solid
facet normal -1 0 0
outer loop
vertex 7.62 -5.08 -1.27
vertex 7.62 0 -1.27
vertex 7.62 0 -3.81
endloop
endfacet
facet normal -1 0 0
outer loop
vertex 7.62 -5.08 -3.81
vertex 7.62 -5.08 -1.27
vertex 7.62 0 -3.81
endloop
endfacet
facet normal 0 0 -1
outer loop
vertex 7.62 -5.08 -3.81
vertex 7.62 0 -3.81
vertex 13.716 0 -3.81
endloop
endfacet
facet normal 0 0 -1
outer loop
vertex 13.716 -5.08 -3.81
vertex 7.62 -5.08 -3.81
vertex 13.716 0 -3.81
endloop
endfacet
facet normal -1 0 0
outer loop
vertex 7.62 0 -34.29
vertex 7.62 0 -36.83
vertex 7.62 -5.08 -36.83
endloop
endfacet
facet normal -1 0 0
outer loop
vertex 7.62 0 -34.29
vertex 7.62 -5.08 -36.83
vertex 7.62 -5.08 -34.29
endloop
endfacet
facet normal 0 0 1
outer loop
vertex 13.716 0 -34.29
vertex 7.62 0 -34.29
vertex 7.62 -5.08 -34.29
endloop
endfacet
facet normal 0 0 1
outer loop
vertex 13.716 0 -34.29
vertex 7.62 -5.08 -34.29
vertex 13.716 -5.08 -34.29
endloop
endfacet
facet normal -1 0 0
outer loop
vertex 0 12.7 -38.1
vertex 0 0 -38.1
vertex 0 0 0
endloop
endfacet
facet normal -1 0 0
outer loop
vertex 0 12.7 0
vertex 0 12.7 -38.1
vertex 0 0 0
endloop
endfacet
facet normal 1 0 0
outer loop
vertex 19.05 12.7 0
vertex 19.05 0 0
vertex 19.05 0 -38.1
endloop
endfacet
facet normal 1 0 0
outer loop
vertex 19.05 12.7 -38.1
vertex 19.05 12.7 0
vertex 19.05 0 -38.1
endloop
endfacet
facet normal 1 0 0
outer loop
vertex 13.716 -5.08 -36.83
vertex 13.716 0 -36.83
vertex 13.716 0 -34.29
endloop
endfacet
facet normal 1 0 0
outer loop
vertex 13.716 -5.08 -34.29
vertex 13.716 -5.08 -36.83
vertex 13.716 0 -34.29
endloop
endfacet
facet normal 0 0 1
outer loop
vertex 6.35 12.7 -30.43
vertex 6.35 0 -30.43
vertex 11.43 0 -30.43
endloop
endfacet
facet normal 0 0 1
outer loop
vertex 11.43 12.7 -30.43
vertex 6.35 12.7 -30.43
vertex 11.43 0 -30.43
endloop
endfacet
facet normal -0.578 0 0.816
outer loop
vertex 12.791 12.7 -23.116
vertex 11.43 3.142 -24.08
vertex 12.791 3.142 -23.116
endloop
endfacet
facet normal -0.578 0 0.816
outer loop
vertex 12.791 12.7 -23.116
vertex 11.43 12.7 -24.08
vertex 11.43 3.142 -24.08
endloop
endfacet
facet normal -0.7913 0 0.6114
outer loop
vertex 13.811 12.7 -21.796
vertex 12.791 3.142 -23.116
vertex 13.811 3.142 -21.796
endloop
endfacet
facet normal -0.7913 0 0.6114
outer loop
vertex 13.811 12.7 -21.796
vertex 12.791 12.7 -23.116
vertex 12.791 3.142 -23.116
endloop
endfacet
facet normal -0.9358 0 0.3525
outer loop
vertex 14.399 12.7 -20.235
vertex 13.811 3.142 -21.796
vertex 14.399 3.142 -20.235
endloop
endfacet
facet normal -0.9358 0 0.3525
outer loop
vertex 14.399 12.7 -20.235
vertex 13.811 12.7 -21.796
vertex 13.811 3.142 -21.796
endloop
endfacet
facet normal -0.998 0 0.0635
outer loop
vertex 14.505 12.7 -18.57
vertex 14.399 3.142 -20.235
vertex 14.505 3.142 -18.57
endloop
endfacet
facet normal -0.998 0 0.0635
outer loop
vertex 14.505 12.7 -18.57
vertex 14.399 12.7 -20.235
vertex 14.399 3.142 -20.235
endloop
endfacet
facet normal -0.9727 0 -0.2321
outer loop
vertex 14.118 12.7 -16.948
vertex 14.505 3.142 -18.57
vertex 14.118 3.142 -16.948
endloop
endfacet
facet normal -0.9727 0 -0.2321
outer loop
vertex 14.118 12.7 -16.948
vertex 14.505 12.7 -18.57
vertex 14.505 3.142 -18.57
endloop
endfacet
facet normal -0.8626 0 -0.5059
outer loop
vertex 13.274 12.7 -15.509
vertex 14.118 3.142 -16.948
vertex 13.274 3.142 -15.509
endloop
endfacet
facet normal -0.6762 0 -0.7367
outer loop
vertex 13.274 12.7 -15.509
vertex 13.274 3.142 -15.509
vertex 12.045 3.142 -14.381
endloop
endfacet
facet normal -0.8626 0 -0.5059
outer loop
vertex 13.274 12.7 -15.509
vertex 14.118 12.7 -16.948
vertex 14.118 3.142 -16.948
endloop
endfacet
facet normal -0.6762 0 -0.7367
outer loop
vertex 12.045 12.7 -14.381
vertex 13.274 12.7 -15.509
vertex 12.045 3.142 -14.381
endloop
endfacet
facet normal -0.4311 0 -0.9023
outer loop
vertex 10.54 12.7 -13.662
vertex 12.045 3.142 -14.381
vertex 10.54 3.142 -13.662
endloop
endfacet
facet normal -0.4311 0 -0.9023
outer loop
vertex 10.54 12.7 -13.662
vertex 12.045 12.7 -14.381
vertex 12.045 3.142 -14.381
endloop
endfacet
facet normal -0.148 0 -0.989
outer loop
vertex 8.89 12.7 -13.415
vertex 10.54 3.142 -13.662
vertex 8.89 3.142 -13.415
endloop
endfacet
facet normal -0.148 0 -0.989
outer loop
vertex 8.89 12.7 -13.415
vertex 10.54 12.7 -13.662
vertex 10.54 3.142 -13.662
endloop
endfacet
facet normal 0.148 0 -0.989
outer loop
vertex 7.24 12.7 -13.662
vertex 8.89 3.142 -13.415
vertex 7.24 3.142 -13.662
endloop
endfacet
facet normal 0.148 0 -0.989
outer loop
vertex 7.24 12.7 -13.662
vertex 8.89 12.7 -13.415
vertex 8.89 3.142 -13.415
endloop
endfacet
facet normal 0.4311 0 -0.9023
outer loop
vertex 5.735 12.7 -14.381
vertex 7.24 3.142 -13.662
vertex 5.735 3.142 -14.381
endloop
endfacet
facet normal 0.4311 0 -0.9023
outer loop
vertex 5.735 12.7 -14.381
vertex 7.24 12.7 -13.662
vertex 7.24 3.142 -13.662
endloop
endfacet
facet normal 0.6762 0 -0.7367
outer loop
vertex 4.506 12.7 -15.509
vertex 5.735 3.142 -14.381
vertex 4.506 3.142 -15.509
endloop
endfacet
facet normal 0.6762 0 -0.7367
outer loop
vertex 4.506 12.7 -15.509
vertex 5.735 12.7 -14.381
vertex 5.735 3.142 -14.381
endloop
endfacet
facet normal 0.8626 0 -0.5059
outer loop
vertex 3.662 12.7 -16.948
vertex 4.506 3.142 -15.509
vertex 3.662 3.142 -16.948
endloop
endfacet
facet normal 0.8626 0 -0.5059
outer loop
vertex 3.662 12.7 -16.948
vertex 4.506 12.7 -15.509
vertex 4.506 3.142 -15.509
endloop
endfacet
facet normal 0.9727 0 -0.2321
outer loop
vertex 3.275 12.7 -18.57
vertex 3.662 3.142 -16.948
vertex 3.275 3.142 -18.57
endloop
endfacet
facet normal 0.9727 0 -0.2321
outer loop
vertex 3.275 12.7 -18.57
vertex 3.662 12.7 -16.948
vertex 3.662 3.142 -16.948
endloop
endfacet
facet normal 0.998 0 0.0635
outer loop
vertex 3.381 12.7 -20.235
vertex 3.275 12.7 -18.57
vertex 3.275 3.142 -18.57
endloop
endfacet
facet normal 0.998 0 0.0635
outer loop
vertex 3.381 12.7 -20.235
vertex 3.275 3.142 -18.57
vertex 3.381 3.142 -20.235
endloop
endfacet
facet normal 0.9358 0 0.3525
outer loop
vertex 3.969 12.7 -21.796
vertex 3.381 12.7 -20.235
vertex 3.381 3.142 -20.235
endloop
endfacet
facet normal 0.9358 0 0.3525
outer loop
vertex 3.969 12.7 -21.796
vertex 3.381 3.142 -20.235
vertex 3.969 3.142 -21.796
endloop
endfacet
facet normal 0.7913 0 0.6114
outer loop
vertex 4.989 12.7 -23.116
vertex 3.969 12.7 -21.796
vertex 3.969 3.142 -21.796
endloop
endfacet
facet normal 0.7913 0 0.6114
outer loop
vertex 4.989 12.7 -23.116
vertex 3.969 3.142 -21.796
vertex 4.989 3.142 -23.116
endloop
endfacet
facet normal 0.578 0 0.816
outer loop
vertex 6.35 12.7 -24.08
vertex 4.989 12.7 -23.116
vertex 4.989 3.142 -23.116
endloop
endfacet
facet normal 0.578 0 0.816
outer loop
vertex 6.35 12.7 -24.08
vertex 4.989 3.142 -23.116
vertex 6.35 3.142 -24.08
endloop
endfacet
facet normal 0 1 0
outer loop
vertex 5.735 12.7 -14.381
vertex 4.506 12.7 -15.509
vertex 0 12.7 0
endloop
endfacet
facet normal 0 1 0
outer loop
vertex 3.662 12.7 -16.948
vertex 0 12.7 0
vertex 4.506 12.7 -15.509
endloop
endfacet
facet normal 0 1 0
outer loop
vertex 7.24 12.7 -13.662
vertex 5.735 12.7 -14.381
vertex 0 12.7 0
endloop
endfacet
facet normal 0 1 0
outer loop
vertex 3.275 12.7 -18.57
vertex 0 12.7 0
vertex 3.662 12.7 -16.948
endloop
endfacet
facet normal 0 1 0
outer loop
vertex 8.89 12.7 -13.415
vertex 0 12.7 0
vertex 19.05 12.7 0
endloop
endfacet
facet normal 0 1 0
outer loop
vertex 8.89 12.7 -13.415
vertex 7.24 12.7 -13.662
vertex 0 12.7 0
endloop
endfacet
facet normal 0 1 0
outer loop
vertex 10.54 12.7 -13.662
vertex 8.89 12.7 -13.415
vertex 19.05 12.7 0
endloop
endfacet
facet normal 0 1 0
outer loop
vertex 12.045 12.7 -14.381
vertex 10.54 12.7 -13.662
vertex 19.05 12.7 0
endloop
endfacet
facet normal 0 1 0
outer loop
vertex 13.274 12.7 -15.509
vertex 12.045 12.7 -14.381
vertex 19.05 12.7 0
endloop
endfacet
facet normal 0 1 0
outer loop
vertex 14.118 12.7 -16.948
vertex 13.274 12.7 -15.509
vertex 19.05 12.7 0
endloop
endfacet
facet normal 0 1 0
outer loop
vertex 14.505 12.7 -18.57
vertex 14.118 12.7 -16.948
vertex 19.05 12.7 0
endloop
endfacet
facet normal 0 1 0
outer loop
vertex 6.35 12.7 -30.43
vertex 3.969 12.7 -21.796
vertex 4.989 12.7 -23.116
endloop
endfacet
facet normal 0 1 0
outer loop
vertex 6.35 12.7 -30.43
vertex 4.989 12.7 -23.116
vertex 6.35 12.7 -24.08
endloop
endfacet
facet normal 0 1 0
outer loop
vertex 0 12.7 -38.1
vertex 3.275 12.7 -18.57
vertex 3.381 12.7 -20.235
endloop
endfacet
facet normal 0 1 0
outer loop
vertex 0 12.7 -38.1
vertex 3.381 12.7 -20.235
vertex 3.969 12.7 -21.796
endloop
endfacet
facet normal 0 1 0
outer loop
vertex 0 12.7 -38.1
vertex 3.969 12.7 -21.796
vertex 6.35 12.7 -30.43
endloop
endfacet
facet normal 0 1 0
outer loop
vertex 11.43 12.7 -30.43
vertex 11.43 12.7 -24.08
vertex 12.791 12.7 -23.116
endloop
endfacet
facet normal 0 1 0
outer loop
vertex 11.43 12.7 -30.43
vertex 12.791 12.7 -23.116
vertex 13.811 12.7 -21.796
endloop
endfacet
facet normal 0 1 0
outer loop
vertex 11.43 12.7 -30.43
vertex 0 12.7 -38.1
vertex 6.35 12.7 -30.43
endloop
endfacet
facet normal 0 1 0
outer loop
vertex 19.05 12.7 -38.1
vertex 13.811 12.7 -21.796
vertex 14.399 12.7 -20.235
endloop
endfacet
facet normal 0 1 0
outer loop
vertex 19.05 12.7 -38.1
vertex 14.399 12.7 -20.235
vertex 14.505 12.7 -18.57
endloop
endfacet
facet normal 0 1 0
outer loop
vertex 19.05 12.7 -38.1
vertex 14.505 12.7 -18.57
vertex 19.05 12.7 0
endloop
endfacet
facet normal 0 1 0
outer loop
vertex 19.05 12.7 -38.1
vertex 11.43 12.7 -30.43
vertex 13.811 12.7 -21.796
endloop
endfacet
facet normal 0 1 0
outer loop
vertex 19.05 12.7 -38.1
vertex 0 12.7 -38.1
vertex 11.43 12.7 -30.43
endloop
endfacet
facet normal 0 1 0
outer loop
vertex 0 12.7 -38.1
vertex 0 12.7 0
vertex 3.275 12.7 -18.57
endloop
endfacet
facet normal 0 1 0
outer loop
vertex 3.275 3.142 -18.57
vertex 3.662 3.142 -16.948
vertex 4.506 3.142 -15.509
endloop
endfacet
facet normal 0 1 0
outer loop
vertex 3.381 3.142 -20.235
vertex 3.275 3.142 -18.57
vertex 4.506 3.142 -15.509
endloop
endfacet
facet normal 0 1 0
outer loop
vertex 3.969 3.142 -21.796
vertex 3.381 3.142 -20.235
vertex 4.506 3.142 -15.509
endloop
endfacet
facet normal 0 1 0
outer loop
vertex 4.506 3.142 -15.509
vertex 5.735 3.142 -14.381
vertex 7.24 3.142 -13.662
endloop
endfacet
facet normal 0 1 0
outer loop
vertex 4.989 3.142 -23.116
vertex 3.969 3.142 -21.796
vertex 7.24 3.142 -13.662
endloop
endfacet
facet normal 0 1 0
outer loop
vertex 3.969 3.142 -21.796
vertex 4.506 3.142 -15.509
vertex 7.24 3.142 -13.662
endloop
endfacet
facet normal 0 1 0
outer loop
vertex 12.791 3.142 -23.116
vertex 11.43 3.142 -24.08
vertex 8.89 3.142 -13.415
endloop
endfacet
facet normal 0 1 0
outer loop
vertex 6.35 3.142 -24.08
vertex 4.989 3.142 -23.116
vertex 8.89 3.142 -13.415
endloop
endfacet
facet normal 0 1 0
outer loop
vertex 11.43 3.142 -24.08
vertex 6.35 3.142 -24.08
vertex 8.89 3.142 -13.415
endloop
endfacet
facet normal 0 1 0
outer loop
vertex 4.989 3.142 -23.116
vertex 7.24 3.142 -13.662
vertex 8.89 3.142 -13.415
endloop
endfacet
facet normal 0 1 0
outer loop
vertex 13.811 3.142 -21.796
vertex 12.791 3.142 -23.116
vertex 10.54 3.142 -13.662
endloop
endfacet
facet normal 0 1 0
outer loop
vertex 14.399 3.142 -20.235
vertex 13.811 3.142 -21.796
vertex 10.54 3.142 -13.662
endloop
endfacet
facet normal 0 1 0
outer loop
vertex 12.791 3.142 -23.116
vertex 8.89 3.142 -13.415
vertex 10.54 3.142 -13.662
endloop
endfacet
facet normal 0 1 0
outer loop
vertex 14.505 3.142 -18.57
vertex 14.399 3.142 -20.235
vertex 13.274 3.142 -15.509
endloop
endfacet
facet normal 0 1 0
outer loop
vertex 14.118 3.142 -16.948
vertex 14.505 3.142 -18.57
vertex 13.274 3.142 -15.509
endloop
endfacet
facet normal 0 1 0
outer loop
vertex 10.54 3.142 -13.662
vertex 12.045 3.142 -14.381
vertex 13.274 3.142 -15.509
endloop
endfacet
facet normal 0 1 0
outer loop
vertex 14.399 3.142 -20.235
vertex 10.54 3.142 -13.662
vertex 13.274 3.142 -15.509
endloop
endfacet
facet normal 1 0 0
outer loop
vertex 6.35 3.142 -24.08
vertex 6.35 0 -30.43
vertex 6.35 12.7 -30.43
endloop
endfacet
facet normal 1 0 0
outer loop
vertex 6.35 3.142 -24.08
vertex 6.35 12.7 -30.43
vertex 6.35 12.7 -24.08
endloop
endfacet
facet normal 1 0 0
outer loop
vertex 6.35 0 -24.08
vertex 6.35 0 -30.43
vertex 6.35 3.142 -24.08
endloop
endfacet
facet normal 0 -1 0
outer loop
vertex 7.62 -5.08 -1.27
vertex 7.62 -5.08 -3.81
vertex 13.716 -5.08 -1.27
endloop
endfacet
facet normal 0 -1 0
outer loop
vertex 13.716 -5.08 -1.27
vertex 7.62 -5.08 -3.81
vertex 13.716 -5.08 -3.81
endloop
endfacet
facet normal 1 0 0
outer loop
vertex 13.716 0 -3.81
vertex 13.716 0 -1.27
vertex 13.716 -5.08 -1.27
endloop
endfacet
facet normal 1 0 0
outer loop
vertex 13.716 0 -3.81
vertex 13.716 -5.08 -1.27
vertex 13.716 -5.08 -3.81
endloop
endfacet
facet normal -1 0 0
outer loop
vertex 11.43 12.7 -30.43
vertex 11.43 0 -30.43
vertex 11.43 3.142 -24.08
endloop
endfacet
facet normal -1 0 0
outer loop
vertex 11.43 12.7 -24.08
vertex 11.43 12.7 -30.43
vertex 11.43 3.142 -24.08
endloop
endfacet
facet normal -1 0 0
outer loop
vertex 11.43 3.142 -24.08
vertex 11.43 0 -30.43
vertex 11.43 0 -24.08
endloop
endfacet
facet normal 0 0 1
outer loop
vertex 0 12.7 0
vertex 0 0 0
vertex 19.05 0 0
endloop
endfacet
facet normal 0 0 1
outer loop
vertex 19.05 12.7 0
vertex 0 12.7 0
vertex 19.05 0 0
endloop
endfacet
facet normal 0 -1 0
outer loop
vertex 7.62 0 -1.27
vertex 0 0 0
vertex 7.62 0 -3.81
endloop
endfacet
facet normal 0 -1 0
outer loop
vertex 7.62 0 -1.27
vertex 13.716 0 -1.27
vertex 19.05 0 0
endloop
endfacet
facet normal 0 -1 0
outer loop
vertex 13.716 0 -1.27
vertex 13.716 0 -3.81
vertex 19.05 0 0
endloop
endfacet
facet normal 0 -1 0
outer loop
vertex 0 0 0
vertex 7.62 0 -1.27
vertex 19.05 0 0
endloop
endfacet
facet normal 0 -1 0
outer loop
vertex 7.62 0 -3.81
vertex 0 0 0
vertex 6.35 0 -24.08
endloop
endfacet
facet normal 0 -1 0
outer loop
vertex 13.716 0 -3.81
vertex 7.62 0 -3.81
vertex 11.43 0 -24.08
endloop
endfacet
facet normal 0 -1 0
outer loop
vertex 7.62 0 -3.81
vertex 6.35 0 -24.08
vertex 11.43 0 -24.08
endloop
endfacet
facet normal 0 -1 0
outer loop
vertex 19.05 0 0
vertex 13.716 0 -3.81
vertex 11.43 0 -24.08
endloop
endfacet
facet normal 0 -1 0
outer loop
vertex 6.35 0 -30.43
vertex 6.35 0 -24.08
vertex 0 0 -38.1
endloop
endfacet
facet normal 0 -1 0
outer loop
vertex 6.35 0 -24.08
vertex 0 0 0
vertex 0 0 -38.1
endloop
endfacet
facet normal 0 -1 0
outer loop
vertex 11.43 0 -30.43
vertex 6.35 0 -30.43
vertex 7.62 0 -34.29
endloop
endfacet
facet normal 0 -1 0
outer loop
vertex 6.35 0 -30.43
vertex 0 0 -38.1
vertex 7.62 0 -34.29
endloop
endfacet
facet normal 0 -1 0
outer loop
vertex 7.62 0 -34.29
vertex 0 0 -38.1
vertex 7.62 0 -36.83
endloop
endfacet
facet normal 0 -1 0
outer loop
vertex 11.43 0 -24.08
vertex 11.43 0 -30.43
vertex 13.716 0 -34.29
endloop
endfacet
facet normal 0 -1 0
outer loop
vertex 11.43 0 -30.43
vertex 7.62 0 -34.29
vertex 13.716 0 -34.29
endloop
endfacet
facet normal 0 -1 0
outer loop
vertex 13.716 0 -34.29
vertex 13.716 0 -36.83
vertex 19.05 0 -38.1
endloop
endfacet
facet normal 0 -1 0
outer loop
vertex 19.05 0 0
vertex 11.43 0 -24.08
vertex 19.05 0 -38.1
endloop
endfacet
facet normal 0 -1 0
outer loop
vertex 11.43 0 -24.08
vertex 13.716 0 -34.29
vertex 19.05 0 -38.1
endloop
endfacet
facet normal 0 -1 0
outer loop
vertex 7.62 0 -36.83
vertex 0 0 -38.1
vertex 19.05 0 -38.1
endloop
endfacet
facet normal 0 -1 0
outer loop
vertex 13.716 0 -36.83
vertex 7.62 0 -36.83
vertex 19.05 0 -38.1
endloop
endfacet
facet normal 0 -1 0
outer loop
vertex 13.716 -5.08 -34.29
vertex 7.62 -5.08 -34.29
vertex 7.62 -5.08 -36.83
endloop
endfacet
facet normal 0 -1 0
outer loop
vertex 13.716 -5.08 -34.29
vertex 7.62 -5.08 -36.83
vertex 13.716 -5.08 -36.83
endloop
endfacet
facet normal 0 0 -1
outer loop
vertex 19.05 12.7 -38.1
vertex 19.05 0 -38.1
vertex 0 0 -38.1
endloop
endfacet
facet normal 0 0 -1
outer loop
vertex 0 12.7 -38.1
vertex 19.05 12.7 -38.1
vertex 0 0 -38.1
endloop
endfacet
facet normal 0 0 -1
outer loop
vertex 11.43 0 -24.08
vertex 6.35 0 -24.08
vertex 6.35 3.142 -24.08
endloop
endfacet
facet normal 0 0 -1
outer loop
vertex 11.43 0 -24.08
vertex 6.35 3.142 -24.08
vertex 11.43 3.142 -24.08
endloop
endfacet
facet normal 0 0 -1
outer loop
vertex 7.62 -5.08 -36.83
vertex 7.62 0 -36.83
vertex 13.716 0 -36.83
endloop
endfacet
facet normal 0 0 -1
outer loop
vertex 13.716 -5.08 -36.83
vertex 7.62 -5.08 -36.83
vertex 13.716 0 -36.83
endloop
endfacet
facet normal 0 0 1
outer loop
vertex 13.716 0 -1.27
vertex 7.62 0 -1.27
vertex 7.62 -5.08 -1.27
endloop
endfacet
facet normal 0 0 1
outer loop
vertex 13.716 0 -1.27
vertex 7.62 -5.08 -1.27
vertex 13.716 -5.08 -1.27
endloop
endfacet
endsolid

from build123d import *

# Parameters (mm, degrees)
BOSS_EXTRUDE1_DEPTH       = 12.7
SKETCH2_R                 = 5.635000033
HAPTIC_MOTOR_CUTOUT_DEPTH = 9.557999934
SKETCH3_W                 = 5.08
SKETCH3_H                 = 6.35
HAPTIC_WIRE_CUTOUT_DEPTH  = 13.7
SKETCH4_W                 = 6.096
SKETCH4_H                 = 2.54
PINS_DEPTH                = 5.08


with BuildPart() as part:
    # Sketch1 → Boss-Extrude1 (new body)
    with BuildSketch(Plane(origin=(0, 0, 0), x_dir=(1, 0, 0), z_dir=(0, 1, 0))):
        Polygon((0, 0), (19.05, 0), (19.05, 19.05), (19.05, 38.1), (0, 38.1), (0, 19.05), align=None)
    extrude(amount=BOSS_EXTRUDE1_DEPTH)

    # Sketch2 → Haptic Motor Cutout (cut)
    with BuildSketch(Plane.XZ.offset(-12.7)):
        with Locations((8.89, -19.05)):
            Circle(SKETCH2_R)
    extrude(amount=HAPTIC_MOTOR_CUTOUT_DEPTH, mode=Mode.SUBTRACT)

    # Sketch3 → Haptic Wire Cutout (cut, through all)
    with BuildSketch(Plane.XZ):
        with Locations((8.89, -27.255072104)):
            Rectangle(SKETCH3_W, SKETCH3_H)
    extrude(amount=-HAPTIC_WIRE_CUTOUT_DEPTH, mode=Mode.SUBTRACT)

    # Sketch4 → Pins (add)
    with BuildSketch(Plane.XZ):
        with Locations((10.668, -35.56)):
            Rectangle(SKETCH4_W, SKETCH4_H)
    pins = extrude(amount=PINS_DEPTH)

    # Mirror1: Pins across plane
    add(pins.mirror(Plane(origin=(0, 0, -19.05), x_dir=(1, 0, 0), z_dir=(0, 0, -1))))


solid = part.part
